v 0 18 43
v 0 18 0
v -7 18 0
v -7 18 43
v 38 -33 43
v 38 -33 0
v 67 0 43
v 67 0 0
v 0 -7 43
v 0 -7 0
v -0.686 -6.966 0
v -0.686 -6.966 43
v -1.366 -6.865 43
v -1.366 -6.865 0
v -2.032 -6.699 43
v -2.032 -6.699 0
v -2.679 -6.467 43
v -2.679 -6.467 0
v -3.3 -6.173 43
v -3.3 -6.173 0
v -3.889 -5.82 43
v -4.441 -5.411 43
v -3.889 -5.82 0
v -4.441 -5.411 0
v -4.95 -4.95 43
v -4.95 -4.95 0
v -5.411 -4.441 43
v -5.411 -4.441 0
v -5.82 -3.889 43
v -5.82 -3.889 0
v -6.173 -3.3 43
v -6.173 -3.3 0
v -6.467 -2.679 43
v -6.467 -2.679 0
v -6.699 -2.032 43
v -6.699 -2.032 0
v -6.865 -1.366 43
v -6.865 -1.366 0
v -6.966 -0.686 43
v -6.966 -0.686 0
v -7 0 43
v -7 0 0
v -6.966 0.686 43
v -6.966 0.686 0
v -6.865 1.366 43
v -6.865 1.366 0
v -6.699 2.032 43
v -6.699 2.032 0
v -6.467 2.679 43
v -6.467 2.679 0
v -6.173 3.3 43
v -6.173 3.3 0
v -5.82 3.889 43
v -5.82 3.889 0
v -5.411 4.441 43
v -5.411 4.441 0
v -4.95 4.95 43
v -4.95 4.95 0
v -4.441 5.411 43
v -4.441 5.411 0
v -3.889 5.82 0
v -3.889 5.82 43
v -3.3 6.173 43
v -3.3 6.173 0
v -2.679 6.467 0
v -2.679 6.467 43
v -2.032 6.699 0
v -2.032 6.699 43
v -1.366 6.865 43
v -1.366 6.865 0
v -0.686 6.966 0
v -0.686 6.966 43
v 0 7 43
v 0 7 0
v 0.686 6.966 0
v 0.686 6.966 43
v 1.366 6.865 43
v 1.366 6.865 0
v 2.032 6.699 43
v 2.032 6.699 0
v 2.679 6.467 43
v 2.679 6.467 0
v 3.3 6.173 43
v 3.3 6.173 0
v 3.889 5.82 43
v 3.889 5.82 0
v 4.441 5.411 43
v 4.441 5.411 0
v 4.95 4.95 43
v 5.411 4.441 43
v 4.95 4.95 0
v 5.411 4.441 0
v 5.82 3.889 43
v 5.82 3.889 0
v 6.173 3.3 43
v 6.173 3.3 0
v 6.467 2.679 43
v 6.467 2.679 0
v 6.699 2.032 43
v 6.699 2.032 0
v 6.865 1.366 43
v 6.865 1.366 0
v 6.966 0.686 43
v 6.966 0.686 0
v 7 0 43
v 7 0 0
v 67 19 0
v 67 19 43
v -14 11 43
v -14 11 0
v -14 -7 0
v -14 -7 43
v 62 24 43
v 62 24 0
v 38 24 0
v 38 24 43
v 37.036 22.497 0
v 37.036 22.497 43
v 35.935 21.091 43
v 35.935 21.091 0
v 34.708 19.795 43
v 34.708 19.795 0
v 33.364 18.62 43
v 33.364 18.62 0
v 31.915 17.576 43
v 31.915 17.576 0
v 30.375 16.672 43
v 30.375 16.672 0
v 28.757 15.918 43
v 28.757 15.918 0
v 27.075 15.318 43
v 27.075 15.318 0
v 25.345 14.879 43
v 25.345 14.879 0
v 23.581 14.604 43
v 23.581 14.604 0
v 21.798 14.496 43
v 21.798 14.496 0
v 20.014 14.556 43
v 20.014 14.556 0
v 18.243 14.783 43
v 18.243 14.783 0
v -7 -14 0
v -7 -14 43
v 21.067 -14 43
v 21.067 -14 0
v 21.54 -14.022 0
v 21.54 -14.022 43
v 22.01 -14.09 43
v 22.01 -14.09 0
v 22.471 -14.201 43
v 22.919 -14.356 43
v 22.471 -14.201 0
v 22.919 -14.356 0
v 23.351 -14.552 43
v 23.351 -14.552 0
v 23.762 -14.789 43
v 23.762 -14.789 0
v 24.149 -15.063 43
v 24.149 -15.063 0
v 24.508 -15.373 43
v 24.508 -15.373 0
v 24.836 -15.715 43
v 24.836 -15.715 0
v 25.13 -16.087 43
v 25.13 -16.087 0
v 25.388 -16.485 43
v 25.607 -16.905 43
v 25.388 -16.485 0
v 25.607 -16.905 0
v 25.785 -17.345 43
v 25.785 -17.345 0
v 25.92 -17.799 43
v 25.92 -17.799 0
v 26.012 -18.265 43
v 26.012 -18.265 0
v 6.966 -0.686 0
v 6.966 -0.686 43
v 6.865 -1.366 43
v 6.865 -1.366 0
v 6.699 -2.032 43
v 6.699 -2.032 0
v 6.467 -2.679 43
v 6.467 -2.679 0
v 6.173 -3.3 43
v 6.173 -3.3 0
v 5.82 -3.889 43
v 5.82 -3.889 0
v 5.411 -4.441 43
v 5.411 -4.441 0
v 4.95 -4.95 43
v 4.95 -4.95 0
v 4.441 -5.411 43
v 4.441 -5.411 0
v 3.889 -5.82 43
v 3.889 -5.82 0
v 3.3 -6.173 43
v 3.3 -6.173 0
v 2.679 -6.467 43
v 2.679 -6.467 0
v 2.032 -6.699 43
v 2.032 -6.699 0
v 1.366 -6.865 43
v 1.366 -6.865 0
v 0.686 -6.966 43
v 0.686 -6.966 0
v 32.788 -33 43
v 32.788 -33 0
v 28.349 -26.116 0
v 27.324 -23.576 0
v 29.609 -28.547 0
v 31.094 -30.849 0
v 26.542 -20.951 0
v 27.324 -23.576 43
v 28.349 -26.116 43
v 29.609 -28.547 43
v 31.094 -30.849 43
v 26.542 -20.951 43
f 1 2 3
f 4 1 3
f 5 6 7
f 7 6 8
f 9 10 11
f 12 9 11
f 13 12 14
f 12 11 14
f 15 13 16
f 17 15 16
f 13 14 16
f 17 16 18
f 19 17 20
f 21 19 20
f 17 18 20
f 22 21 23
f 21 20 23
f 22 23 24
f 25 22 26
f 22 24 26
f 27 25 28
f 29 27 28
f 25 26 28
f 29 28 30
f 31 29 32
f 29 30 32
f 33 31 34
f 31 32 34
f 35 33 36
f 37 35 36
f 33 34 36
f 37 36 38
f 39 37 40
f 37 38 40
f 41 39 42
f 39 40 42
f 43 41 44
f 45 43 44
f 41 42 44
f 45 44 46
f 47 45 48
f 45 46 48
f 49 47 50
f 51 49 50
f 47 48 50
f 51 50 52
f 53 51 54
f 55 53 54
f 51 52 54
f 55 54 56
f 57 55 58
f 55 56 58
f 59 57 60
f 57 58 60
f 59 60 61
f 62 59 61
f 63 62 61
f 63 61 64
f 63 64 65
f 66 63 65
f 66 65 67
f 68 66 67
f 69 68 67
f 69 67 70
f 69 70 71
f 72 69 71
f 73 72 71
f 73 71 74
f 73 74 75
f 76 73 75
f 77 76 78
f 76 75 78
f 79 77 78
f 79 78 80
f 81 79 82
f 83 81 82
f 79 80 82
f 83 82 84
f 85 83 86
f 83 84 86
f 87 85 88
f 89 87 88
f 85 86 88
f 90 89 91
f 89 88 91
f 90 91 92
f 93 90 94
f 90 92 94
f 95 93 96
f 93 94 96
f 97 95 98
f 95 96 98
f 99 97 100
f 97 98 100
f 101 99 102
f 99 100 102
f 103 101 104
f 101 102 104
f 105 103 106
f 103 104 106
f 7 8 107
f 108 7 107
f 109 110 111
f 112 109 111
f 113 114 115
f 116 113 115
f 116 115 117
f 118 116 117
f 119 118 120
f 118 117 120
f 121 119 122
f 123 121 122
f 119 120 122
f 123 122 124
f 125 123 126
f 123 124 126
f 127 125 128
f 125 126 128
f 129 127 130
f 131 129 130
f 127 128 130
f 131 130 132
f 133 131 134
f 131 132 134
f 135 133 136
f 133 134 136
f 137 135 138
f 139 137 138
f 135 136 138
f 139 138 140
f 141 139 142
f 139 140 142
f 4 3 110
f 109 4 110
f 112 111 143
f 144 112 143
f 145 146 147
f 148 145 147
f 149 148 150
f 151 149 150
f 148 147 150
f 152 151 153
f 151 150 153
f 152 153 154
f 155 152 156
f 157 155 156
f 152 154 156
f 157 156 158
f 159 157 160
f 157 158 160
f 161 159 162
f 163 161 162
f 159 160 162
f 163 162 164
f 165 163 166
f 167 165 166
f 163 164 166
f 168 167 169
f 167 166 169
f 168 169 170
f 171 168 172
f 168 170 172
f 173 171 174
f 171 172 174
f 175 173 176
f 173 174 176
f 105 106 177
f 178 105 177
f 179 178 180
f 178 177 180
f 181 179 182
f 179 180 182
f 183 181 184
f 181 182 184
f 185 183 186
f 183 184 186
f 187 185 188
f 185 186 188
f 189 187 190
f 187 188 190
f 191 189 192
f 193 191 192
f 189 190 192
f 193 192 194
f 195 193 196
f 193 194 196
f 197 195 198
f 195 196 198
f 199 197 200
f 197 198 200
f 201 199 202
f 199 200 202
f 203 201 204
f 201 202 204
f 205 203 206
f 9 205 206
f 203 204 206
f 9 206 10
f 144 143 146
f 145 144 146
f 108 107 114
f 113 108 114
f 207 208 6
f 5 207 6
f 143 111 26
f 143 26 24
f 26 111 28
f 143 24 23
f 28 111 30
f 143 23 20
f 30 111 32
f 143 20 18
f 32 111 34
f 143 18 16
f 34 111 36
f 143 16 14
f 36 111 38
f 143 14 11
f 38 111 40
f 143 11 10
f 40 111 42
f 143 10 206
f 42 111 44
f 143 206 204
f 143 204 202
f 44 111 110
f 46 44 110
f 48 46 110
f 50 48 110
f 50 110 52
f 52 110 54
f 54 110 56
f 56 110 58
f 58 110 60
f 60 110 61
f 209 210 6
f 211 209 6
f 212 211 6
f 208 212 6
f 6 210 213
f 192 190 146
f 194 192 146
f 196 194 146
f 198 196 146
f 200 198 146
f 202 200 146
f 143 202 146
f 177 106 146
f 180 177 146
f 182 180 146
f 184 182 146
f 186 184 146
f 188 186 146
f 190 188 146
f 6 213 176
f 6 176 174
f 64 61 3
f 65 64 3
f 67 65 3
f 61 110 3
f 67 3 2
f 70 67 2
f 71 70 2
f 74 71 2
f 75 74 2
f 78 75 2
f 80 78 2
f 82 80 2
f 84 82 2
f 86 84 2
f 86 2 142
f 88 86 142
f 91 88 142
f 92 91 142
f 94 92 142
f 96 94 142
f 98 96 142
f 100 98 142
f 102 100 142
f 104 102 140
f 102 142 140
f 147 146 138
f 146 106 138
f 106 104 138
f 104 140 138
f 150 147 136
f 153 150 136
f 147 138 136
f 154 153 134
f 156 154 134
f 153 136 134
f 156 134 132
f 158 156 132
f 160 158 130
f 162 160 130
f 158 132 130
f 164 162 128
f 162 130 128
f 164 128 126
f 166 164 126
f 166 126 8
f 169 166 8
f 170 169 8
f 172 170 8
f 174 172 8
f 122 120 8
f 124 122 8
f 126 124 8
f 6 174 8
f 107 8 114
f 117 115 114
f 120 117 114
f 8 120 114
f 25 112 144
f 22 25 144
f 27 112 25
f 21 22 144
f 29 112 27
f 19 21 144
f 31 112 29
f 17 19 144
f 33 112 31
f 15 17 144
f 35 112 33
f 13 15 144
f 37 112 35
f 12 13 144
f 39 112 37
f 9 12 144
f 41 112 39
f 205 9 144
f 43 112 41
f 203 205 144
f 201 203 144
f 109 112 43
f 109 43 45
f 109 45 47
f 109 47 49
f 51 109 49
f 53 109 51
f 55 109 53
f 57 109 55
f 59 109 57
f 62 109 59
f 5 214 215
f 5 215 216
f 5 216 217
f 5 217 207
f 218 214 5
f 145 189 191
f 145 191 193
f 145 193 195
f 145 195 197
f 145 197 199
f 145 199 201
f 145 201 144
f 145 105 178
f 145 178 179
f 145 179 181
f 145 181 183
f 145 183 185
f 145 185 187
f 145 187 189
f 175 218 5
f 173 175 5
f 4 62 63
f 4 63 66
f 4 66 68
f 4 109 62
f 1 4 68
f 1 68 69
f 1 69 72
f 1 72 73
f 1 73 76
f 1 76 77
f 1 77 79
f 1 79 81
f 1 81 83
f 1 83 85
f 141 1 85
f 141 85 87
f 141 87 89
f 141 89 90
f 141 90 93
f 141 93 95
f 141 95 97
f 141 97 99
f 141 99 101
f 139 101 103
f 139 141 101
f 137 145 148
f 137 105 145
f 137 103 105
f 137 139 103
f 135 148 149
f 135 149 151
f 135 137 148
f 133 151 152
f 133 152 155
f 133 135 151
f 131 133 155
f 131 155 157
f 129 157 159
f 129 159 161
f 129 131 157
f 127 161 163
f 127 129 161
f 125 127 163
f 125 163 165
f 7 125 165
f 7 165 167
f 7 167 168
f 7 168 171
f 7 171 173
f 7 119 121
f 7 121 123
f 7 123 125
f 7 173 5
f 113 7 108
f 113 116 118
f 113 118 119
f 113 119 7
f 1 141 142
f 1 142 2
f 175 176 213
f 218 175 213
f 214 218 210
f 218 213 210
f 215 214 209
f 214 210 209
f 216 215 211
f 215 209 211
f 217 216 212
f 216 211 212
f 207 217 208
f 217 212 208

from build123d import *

# Parameters (mm, degrees)
F1_DEPTH = 43


with BuildPart() as f1:
    # F0 (on Top) → F1 (new body)
    with BuildSketch(Plane.XY):
        with BuildLine():
            Line((-14, 11), (-14, -7))
            Line((-14, -7), (-7, -14))
            Line((-7, -14), (0, -14))
            Line((0, -14), (21.066626, -14))
            ThreePointArc((21.066626, -14), (24.331862, -15.213414), (26.012265, -18.264706))
            ThreePointArc((26.012265, -18.264706), (28.349095, -26.115672), (32.788067, -33))
            Line((32.788067, -33), (38, -33))
            Line((38, -33), (67, 0))
            Line((67, 0), (67, 19))
            Line((67, 19), (62, 24))
            Line((62, 24), (38, 24))
            ThreePointArc((38, 24), (29.574973, 16.276069), (18.243085, 14.783252))
            Line((18.243085, 14.783252), (0, 18))
            Line((0, 18), (-7, 18))
            Line((-7, 18), (-14, 11))
        make_face()
        with BuildLine():
            ThreePointArc((7, 0), (4.949747, -4.949747), (0, -7))
            ThreePointArc((0, -7), (-4.949747, 4.949747), (7, 0))
        make_face(mode=Mode.SUBTRACT)
    extrude(amount=F1_DEPTH)


solid = f1.part
